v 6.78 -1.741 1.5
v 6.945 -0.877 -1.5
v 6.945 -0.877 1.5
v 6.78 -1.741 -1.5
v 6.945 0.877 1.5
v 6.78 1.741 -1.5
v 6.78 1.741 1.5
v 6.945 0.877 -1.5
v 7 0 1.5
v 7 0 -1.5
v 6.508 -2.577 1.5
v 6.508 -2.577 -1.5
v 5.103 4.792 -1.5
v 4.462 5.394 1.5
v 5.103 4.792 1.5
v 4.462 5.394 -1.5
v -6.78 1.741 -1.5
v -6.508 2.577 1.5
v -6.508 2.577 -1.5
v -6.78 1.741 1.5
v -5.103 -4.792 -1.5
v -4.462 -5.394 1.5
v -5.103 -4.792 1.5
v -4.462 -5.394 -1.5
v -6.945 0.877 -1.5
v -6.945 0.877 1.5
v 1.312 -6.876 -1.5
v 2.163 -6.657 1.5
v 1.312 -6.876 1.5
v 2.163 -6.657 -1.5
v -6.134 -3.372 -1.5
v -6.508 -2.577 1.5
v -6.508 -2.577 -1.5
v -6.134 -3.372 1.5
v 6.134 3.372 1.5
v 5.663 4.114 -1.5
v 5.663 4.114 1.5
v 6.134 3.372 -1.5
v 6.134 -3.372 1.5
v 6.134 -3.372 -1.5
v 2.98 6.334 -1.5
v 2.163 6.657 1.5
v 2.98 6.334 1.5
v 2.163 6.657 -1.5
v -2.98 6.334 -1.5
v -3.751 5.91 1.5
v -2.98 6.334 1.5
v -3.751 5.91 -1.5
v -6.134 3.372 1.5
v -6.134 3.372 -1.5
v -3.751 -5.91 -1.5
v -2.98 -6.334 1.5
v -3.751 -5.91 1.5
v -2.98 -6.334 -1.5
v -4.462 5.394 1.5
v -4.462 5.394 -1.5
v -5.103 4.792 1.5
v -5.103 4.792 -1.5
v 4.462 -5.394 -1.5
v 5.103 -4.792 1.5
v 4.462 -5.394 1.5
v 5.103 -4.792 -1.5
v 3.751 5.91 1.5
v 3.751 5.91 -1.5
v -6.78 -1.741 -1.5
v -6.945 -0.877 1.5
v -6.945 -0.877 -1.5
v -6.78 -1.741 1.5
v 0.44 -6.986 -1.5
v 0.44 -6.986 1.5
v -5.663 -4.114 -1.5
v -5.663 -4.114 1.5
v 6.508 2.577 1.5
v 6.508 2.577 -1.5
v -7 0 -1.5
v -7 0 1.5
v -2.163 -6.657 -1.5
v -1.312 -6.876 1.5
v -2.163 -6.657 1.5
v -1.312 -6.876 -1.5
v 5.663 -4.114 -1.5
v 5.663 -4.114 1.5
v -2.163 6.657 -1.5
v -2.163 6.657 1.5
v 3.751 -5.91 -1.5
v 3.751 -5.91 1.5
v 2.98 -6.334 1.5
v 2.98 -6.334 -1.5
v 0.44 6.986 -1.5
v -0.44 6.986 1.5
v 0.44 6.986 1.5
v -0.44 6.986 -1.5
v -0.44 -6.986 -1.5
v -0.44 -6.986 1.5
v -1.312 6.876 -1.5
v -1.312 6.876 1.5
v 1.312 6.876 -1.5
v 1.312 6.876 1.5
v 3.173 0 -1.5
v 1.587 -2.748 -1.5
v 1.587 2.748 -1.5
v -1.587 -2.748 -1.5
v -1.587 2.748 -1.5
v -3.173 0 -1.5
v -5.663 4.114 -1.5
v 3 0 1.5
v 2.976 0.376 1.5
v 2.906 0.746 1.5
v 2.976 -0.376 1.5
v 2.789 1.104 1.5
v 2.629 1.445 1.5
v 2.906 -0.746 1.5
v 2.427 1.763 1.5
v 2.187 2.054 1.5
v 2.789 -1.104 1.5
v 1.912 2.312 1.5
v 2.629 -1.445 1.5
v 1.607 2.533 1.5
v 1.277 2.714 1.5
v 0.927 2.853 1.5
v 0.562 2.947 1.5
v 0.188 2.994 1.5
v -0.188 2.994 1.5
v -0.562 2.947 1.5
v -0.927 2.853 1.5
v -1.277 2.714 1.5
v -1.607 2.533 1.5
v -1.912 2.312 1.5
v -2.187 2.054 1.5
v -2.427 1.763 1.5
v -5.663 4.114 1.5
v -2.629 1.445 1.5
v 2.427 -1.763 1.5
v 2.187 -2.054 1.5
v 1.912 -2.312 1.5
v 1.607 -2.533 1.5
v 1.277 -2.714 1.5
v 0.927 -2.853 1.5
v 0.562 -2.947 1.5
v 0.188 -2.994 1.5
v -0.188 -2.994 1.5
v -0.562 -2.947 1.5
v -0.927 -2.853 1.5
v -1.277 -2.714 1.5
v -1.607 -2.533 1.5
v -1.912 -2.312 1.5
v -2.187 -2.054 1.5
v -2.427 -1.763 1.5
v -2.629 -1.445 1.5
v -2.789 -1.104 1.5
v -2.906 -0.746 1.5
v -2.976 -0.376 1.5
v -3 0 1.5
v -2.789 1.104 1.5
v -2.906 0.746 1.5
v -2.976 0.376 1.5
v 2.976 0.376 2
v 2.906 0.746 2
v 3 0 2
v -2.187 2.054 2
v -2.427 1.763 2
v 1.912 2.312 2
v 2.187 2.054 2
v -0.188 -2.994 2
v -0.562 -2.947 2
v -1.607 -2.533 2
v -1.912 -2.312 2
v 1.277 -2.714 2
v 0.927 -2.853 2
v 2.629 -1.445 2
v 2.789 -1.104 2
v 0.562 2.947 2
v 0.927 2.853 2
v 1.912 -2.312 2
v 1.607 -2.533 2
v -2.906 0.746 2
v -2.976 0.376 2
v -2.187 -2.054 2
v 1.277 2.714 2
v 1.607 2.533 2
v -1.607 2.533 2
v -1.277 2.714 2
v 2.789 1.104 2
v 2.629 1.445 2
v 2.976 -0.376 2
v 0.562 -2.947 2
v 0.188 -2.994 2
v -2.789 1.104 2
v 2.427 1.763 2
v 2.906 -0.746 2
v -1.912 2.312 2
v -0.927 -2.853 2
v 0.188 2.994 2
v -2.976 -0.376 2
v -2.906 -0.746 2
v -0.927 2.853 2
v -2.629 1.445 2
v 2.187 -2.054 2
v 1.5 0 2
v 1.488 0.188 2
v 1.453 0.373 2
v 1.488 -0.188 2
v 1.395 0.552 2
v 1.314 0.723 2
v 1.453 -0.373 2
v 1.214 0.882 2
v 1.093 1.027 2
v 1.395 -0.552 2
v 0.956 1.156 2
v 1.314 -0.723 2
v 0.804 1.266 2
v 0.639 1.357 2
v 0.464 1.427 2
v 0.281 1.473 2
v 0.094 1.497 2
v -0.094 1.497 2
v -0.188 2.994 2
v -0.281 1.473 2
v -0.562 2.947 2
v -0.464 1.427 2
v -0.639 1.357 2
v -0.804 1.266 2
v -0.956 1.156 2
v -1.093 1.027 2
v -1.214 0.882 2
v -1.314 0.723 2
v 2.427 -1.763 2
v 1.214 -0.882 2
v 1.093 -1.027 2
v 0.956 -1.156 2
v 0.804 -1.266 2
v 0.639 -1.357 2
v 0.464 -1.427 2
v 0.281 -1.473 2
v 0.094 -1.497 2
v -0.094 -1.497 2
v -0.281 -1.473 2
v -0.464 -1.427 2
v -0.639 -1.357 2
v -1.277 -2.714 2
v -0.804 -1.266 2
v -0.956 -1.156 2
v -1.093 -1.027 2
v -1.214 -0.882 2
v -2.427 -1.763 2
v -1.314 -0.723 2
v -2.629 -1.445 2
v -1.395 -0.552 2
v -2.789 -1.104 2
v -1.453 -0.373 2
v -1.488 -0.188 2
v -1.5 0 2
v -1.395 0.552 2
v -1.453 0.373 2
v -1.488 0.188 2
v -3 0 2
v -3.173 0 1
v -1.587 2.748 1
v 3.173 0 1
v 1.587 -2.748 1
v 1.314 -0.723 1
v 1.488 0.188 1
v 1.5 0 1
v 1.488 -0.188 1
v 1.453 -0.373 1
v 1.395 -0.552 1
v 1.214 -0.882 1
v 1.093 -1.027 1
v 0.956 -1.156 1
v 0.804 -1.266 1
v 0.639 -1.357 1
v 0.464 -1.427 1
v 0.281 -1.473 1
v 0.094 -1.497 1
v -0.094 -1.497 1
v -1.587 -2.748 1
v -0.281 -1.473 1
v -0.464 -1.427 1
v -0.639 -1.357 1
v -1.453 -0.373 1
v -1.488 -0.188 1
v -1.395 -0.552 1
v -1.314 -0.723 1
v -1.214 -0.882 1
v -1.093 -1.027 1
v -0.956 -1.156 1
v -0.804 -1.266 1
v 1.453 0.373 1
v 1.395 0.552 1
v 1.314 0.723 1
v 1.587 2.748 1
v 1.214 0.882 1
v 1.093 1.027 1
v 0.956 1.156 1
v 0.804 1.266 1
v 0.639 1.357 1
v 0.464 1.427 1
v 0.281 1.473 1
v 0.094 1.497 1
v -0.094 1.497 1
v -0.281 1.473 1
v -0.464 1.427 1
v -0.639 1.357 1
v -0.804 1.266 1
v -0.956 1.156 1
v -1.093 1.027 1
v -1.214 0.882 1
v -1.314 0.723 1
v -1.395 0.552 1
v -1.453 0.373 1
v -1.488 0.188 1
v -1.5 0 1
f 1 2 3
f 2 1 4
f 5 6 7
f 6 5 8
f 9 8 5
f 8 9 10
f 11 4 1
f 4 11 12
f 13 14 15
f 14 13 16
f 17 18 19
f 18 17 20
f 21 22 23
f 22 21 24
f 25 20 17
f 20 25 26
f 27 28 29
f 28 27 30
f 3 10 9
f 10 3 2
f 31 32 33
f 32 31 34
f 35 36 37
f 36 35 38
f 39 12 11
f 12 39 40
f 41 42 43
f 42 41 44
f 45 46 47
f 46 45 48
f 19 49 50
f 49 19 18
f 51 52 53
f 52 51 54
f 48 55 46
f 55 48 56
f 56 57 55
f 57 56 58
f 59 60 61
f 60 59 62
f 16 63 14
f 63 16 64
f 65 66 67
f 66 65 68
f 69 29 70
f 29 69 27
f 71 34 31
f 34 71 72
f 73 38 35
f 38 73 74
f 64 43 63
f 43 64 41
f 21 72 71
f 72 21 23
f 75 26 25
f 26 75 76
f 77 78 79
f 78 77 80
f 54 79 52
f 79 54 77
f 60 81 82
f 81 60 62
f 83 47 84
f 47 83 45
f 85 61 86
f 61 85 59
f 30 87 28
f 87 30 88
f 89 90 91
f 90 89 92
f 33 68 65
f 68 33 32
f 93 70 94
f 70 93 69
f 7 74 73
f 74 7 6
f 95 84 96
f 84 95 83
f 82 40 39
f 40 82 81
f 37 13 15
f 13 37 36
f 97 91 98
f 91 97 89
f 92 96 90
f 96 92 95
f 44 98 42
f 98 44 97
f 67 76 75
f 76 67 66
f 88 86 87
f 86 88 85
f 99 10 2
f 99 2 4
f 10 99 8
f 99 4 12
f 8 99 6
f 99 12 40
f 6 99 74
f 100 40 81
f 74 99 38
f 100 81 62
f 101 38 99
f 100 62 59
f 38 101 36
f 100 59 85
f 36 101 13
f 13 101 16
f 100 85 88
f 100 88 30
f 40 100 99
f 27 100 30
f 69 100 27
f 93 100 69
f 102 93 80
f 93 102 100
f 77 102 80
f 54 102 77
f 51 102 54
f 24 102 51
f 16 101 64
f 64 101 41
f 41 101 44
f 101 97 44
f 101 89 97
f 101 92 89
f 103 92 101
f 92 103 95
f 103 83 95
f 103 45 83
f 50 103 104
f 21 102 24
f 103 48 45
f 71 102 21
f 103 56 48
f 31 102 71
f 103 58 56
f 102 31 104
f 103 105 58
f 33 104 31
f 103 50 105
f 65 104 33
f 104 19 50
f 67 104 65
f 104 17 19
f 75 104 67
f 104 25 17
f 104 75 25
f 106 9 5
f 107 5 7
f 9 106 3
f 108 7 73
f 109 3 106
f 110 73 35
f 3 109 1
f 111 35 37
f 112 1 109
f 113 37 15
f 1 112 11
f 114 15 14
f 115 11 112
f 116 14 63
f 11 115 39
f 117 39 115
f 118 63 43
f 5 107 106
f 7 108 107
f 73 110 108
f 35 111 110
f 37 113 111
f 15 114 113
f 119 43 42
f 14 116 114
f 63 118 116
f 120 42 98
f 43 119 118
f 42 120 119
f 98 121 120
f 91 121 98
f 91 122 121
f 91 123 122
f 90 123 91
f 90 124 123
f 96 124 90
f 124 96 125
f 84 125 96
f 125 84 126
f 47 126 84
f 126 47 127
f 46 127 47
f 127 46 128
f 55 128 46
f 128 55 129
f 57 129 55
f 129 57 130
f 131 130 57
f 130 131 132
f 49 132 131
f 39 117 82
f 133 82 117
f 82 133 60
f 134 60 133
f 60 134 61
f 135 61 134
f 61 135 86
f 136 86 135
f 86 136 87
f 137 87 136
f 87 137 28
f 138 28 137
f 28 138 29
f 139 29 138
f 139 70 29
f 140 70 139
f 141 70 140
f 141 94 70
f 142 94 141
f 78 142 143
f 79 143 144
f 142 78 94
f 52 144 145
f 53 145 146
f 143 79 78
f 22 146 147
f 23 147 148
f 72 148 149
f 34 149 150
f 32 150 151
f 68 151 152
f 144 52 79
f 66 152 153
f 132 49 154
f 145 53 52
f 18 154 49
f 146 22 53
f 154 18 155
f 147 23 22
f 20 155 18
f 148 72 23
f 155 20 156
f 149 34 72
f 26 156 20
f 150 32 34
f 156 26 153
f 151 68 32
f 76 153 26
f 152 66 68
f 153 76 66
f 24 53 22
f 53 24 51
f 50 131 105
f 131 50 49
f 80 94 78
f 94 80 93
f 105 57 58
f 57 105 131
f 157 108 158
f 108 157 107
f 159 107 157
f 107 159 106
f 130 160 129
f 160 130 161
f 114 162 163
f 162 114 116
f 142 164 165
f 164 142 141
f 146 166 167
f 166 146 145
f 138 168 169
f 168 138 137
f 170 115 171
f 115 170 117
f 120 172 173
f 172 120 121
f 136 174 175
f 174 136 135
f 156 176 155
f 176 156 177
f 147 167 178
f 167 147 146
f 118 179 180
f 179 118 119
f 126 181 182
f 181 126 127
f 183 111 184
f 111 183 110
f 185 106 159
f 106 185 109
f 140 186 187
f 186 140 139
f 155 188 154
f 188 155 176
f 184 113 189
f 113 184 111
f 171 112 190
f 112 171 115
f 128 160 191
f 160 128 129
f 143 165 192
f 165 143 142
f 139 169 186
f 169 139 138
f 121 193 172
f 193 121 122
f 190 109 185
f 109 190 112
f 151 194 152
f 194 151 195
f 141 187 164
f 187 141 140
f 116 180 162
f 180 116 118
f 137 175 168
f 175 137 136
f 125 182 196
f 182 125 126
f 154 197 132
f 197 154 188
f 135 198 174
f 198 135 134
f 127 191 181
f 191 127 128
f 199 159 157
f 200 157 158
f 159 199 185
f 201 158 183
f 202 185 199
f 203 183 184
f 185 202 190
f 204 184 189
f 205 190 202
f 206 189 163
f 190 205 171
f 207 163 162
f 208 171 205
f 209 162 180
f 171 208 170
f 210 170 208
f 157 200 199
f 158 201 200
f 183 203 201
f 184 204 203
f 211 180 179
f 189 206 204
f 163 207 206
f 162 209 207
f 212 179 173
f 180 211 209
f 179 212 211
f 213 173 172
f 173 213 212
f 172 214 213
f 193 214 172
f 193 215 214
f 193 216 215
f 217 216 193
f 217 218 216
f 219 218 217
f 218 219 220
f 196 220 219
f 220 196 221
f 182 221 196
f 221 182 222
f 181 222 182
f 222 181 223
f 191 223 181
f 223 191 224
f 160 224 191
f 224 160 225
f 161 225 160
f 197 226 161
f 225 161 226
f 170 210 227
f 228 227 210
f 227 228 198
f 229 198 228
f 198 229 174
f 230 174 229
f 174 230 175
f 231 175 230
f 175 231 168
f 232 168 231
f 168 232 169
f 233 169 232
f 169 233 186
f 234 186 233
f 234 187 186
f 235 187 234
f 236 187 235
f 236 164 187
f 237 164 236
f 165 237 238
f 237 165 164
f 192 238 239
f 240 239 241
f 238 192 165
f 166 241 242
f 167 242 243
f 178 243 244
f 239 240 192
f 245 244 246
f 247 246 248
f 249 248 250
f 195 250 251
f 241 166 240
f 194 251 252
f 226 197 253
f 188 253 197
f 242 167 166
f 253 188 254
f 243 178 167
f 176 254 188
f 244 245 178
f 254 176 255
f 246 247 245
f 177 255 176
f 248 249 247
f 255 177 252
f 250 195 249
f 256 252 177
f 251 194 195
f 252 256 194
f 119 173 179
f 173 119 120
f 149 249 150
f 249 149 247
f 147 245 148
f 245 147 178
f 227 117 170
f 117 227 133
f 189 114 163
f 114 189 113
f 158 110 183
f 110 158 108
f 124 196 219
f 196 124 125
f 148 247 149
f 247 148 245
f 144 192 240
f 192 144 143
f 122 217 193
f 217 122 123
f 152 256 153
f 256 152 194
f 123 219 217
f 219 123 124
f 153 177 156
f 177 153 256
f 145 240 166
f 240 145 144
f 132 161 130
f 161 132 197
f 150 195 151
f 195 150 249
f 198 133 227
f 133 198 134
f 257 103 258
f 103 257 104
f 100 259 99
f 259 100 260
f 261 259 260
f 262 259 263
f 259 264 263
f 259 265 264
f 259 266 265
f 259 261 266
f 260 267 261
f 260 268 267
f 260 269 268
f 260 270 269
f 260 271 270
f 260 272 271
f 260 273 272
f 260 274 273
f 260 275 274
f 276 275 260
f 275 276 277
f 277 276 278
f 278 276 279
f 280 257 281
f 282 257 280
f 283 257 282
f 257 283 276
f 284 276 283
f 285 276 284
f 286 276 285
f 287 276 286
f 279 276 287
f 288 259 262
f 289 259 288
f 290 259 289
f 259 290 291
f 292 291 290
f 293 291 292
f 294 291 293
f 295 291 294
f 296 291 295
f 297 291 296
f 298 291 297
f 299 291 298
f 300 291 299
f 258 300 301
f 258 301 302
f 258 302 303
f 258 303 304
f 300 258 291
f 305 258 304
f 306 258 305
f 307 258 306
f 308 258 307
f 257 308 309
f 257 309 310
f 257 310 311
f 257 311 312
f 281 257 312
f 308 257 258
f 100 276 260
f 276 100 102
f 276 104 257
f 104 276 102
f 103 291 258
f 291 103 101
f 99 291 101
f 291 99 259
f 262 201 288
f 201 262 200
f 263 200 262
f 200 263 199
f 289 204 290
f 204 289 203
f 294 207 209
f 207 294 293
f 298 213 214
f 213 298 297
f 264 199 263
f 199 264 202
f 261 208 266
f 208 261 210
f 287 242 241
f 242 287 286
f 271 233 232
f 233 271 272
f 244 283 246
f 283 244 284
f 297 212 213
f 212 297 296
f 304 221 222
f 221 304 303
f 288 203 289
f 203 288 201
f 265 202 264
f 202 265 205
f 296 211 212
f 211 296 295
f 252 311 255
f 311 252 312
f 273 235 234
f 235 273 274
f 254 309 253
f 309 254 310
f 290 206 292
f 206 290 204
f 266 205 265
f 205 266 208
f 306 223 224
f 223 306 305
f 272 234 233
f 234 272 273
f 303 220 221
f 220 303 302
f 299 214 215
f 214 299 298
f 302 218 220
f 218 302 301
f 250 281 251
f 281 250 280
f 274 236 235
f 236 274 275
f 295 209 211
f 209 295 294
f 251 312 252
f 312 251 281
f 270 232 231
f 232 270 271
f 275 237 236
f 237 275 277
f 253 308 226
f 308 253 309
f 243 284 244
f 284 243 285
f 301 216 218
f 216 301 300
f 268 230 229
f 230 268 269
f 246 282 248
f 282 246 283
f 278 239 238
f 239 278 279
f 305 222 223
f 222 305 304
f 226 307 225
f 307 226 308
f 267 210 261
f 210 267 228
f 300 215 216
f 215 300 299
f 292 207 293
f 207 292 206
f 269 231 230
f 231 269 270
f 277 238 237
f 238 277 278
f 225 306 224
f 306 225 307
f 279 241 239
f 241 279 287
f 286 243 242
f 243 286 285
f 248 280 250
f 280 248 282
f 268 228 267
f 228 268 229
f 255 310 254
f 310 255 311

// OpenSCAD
$fn = 50;


difference() {
	union() {
		translate(v = [0, 0, -1.5000000000]) {
			cylinder(h = 3, r = 7.0000000000);
		}
		translate(v = [0, 0, -1.5000000000]) {
			cylinder(h = 3.5000000000, r = 3.0000000000);
		}
	}
	union() {
		translate(v = [0, 0, -1.5000000000]) {
			rotate(a = [0, 0, 0]) {
				difference() {
					union() {
						linear_extrude(height = 2.5000000000) {
							polygon(points = [[3.1735000000, 0.0000000000], [1.5867500000, 2.7483316189], [-1.5867500000, 2.7483316189], [-3.1735000000, 0.0000000000], [-1.5867500000, -2.7483316189], [1.5867500000, -2.7483316189]]);
						}
					}
					union();
				}
			}
		}
		translate(v = [0, 0, -100.0000000000]) {
			cylinder(h = 200, r = 1.5000000000);
		}
	}
}
